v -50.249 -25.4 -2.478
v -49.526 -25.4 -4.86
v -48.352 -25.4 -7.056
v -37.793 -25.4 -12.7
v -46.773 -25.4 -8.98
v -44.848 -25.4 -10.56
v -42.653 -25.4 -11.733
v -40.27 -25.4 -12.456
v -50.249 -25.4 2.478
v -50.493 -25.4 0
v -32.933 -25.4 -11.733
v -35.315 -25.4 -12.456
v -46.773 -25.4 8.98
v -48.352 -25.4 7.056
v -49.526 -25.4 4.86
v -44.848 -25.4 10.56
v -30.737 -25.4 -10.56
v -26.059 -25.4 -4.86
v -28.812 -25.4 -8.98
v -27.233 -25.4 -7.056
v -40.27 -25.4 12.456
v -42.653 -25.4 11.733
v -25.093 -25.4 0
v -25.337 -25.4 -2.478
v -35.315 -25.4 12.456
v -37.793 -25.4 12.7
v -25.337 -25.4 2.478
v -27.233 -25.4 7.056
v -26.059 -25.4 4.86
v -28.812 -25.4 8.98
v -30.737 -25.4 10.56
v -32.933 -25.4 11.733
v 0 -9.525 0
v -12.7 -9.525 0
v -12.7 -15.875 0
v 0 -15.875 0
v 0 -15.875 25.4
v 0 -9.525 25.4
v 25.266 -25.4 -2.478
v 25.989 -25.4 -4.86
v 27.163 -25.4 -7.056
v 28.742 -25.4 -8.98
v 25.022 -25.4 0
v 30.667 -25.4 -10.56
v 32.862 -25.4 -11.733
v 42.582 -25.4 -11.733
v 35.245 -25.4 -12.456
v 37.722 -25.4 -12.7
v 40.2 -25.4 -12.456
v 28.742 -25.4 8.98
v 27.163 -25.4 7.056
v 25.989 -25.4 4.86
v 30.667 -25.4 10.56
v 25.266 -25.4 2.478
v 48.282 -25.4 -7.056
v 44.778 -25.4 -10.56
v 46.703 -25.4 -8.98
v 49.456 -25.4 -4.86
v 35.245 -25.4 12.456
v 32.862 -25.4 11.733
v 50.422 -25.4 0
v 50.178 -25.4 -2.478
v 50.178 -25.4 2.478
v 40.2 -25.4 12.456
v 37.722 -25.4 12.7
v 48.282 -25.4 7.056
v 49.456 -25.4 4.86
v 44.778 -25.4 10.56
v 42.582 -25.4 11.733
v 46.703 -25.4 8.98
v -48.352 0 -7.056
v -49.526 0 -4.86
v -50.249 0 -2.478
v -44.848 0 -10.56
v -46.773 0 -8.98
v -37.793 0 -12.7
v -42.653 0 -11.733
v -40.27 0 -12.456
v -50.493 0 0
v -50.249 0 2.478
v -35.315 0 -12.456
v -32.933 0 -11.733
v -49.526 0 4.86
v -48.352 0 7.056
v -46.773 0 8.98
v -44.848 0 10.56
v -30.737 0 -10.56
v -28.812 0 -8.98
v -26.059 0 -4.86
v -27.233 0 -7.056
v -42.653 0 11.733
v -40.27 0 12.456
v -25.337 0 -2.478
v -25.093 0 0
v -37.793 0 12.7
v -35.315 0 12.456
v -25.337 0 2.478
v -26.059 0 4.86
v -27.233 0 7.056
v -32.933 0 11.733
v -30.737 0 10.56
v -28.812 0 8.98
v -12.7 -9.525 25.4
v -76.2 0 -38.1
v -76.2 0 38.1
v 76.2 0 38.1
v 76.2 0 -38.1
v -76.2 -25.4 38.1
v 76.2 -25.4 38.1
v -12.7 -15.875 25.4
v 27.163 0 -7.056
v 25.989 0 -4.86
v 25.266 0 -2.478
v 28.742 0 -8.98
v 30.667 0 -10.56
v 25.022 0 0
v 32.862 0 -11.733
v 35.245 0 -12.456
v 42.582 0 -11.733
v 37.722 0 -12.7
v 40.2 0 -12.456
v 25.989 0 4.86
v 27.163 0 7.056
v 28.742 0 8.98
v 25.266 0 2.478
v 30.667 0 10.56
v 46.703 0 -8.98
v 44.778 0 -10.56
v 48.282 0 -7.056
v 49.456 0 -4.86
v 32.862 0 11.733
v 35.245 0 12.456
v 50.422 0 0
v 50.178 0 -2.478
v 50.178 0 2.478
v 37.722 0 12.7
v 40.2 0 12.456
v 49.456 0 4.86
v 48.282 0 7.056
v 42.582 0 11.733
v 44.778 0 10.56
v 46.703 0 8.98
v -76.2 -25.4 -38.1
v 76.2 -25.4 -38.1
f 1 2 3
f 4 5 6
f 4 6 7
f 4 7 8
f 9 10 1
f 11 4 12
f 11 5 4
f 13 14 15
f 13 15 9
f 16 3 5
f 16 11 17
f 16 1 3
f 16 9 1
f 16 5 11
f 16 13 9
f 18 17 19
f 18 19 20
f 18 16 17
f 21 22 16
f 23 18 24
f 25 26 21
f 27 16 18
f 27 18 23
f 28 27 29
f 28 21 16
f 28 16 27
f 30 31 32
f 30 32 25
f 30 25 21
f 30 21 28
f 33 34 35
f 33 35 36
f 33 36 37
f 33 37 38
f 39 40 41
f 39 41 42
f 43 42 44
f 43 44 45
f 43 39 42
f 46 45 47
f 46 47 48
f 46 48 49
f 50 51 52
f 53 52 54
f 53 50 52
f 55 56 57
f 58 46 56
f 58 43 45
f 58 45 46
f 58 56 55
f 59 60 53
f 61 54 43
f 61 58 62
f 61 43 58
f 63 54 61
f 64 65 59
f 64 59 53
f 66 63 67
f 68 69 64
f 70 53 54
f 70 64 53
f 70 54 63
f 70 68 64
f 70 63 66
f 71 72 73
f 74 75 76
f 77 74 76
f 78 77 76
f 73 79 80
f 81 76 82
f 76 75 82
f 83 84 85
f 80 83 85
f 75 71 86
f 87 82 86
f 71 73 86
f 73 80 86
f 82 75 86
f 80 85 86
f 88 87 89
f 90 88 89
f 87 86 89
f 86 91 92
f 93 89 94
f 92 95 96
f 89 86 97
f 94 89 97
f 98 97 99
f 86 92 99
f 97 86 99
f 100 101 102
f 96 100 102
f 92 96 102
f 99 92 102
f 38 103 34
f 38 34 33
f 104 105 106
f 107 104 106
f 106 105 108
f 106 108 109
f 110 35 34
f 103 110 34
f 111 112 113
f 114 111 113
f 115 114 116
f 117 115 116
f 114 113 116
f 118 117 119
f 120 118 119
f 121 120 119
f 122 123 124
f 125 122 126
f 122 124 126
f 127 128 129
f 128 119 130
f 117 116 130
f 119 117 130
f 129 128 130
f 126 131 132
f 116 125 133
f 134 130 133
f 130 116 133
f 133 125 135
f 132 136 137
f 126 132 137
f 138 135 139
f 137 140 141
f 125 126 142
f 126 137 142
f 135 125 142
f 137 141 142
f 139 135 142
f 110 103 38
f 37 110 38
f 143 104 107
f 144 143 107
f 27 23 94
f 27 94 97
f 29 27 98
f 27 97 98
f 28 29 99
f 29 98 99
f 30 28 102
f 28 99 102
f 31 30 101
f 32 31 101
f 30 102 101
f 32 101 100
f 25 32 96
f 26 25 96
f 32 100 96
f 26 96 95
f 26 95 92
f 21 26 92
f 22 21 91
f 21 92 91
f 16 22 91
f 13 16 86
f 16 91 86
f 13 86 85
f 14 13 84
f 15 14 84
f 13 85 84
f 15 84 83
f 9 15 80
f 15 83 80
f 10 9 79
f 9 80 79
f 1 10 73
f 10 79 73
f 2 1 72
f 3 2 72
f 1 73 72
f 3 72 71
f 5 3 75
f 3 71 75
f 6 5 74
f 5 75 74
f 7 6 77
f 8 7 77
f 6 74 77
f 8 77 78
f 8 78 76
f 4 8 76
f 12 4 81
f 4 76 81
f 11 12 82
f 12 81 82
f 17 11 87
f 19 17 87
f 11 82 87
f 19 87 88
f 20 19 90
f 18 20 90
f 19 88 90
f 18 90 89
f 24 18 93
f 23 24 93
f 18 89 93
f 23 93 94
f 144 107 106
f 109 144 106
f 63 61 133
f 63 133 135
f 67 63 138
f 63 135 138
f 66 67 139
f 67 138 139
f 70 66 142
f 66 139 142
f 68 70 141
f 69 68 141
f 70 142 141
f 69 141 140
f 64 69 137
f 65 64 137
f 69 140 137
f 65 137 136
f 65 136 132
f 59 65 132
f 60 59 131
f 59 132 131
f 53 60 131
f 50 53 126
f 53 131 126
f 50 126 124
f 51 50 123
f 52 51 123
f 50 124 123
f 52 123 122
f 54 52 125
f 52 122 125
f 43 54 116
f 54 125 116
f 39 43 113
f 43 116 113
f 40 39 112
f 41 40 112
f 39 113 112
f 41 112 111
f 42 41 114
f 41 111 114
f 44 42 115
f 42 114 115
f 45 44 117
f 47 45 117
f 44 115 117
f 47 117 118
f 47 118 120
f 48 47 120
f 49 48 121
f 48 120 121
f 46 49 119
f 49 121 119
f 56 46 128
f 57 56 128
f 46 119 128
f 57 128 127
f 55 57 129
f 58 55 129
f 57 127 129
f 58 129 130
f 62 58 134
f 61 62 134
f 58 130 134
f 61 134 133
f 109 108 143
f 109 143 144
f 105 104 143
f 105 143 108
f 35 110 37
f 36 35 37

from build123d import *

# Parameters (mm, degrees)
F0_W     = 152.4
F0_H     = 76.2
F4_DEPTH = 25.4
F1_R     = 12.7
F2_R     = 12.7
F3_W     = 12.7
F3_H     = 6.35
F5_DEPTH = 25.4


with BuildPart() as f4:
    # F0 (on Front) → F4 (new body)
    with BuildSketch(Plane.XZ):
        Rectangle(F0_W, F0_H)
    extrude(amount=F4_DEPTH)

    # F3 (on Top) → F5 (cut)
    with BuildSketch(Plane.XY):
        with Locations((-6.35, -12.7)):
            Rectangle(F3_W, F3_H)
    extrude(amount=F5_DEPTH, mode=Mode.SUBTRACT)


with BuildPart() as f4b:
    # F1 (on face) → F4, piece 2 (new body)
    with BuildSketch(Plane.XZ):
        with Locations((-37.7927422523, 0)):
            Circle(F1_R)
    extrude(amount=F4_DEPTH)


with BuildPart() as f4c:
    # F2 (on face) → F4, piece 3 (new body)
    with BuildSketch(Plane.XZ):
        with Locations((37.7223184247, 0)):
            Circle(F2_R)
    extrude(amount=F4_DEPTH)


solid = Compound([f4.part, f4b.part, f4c.part])
